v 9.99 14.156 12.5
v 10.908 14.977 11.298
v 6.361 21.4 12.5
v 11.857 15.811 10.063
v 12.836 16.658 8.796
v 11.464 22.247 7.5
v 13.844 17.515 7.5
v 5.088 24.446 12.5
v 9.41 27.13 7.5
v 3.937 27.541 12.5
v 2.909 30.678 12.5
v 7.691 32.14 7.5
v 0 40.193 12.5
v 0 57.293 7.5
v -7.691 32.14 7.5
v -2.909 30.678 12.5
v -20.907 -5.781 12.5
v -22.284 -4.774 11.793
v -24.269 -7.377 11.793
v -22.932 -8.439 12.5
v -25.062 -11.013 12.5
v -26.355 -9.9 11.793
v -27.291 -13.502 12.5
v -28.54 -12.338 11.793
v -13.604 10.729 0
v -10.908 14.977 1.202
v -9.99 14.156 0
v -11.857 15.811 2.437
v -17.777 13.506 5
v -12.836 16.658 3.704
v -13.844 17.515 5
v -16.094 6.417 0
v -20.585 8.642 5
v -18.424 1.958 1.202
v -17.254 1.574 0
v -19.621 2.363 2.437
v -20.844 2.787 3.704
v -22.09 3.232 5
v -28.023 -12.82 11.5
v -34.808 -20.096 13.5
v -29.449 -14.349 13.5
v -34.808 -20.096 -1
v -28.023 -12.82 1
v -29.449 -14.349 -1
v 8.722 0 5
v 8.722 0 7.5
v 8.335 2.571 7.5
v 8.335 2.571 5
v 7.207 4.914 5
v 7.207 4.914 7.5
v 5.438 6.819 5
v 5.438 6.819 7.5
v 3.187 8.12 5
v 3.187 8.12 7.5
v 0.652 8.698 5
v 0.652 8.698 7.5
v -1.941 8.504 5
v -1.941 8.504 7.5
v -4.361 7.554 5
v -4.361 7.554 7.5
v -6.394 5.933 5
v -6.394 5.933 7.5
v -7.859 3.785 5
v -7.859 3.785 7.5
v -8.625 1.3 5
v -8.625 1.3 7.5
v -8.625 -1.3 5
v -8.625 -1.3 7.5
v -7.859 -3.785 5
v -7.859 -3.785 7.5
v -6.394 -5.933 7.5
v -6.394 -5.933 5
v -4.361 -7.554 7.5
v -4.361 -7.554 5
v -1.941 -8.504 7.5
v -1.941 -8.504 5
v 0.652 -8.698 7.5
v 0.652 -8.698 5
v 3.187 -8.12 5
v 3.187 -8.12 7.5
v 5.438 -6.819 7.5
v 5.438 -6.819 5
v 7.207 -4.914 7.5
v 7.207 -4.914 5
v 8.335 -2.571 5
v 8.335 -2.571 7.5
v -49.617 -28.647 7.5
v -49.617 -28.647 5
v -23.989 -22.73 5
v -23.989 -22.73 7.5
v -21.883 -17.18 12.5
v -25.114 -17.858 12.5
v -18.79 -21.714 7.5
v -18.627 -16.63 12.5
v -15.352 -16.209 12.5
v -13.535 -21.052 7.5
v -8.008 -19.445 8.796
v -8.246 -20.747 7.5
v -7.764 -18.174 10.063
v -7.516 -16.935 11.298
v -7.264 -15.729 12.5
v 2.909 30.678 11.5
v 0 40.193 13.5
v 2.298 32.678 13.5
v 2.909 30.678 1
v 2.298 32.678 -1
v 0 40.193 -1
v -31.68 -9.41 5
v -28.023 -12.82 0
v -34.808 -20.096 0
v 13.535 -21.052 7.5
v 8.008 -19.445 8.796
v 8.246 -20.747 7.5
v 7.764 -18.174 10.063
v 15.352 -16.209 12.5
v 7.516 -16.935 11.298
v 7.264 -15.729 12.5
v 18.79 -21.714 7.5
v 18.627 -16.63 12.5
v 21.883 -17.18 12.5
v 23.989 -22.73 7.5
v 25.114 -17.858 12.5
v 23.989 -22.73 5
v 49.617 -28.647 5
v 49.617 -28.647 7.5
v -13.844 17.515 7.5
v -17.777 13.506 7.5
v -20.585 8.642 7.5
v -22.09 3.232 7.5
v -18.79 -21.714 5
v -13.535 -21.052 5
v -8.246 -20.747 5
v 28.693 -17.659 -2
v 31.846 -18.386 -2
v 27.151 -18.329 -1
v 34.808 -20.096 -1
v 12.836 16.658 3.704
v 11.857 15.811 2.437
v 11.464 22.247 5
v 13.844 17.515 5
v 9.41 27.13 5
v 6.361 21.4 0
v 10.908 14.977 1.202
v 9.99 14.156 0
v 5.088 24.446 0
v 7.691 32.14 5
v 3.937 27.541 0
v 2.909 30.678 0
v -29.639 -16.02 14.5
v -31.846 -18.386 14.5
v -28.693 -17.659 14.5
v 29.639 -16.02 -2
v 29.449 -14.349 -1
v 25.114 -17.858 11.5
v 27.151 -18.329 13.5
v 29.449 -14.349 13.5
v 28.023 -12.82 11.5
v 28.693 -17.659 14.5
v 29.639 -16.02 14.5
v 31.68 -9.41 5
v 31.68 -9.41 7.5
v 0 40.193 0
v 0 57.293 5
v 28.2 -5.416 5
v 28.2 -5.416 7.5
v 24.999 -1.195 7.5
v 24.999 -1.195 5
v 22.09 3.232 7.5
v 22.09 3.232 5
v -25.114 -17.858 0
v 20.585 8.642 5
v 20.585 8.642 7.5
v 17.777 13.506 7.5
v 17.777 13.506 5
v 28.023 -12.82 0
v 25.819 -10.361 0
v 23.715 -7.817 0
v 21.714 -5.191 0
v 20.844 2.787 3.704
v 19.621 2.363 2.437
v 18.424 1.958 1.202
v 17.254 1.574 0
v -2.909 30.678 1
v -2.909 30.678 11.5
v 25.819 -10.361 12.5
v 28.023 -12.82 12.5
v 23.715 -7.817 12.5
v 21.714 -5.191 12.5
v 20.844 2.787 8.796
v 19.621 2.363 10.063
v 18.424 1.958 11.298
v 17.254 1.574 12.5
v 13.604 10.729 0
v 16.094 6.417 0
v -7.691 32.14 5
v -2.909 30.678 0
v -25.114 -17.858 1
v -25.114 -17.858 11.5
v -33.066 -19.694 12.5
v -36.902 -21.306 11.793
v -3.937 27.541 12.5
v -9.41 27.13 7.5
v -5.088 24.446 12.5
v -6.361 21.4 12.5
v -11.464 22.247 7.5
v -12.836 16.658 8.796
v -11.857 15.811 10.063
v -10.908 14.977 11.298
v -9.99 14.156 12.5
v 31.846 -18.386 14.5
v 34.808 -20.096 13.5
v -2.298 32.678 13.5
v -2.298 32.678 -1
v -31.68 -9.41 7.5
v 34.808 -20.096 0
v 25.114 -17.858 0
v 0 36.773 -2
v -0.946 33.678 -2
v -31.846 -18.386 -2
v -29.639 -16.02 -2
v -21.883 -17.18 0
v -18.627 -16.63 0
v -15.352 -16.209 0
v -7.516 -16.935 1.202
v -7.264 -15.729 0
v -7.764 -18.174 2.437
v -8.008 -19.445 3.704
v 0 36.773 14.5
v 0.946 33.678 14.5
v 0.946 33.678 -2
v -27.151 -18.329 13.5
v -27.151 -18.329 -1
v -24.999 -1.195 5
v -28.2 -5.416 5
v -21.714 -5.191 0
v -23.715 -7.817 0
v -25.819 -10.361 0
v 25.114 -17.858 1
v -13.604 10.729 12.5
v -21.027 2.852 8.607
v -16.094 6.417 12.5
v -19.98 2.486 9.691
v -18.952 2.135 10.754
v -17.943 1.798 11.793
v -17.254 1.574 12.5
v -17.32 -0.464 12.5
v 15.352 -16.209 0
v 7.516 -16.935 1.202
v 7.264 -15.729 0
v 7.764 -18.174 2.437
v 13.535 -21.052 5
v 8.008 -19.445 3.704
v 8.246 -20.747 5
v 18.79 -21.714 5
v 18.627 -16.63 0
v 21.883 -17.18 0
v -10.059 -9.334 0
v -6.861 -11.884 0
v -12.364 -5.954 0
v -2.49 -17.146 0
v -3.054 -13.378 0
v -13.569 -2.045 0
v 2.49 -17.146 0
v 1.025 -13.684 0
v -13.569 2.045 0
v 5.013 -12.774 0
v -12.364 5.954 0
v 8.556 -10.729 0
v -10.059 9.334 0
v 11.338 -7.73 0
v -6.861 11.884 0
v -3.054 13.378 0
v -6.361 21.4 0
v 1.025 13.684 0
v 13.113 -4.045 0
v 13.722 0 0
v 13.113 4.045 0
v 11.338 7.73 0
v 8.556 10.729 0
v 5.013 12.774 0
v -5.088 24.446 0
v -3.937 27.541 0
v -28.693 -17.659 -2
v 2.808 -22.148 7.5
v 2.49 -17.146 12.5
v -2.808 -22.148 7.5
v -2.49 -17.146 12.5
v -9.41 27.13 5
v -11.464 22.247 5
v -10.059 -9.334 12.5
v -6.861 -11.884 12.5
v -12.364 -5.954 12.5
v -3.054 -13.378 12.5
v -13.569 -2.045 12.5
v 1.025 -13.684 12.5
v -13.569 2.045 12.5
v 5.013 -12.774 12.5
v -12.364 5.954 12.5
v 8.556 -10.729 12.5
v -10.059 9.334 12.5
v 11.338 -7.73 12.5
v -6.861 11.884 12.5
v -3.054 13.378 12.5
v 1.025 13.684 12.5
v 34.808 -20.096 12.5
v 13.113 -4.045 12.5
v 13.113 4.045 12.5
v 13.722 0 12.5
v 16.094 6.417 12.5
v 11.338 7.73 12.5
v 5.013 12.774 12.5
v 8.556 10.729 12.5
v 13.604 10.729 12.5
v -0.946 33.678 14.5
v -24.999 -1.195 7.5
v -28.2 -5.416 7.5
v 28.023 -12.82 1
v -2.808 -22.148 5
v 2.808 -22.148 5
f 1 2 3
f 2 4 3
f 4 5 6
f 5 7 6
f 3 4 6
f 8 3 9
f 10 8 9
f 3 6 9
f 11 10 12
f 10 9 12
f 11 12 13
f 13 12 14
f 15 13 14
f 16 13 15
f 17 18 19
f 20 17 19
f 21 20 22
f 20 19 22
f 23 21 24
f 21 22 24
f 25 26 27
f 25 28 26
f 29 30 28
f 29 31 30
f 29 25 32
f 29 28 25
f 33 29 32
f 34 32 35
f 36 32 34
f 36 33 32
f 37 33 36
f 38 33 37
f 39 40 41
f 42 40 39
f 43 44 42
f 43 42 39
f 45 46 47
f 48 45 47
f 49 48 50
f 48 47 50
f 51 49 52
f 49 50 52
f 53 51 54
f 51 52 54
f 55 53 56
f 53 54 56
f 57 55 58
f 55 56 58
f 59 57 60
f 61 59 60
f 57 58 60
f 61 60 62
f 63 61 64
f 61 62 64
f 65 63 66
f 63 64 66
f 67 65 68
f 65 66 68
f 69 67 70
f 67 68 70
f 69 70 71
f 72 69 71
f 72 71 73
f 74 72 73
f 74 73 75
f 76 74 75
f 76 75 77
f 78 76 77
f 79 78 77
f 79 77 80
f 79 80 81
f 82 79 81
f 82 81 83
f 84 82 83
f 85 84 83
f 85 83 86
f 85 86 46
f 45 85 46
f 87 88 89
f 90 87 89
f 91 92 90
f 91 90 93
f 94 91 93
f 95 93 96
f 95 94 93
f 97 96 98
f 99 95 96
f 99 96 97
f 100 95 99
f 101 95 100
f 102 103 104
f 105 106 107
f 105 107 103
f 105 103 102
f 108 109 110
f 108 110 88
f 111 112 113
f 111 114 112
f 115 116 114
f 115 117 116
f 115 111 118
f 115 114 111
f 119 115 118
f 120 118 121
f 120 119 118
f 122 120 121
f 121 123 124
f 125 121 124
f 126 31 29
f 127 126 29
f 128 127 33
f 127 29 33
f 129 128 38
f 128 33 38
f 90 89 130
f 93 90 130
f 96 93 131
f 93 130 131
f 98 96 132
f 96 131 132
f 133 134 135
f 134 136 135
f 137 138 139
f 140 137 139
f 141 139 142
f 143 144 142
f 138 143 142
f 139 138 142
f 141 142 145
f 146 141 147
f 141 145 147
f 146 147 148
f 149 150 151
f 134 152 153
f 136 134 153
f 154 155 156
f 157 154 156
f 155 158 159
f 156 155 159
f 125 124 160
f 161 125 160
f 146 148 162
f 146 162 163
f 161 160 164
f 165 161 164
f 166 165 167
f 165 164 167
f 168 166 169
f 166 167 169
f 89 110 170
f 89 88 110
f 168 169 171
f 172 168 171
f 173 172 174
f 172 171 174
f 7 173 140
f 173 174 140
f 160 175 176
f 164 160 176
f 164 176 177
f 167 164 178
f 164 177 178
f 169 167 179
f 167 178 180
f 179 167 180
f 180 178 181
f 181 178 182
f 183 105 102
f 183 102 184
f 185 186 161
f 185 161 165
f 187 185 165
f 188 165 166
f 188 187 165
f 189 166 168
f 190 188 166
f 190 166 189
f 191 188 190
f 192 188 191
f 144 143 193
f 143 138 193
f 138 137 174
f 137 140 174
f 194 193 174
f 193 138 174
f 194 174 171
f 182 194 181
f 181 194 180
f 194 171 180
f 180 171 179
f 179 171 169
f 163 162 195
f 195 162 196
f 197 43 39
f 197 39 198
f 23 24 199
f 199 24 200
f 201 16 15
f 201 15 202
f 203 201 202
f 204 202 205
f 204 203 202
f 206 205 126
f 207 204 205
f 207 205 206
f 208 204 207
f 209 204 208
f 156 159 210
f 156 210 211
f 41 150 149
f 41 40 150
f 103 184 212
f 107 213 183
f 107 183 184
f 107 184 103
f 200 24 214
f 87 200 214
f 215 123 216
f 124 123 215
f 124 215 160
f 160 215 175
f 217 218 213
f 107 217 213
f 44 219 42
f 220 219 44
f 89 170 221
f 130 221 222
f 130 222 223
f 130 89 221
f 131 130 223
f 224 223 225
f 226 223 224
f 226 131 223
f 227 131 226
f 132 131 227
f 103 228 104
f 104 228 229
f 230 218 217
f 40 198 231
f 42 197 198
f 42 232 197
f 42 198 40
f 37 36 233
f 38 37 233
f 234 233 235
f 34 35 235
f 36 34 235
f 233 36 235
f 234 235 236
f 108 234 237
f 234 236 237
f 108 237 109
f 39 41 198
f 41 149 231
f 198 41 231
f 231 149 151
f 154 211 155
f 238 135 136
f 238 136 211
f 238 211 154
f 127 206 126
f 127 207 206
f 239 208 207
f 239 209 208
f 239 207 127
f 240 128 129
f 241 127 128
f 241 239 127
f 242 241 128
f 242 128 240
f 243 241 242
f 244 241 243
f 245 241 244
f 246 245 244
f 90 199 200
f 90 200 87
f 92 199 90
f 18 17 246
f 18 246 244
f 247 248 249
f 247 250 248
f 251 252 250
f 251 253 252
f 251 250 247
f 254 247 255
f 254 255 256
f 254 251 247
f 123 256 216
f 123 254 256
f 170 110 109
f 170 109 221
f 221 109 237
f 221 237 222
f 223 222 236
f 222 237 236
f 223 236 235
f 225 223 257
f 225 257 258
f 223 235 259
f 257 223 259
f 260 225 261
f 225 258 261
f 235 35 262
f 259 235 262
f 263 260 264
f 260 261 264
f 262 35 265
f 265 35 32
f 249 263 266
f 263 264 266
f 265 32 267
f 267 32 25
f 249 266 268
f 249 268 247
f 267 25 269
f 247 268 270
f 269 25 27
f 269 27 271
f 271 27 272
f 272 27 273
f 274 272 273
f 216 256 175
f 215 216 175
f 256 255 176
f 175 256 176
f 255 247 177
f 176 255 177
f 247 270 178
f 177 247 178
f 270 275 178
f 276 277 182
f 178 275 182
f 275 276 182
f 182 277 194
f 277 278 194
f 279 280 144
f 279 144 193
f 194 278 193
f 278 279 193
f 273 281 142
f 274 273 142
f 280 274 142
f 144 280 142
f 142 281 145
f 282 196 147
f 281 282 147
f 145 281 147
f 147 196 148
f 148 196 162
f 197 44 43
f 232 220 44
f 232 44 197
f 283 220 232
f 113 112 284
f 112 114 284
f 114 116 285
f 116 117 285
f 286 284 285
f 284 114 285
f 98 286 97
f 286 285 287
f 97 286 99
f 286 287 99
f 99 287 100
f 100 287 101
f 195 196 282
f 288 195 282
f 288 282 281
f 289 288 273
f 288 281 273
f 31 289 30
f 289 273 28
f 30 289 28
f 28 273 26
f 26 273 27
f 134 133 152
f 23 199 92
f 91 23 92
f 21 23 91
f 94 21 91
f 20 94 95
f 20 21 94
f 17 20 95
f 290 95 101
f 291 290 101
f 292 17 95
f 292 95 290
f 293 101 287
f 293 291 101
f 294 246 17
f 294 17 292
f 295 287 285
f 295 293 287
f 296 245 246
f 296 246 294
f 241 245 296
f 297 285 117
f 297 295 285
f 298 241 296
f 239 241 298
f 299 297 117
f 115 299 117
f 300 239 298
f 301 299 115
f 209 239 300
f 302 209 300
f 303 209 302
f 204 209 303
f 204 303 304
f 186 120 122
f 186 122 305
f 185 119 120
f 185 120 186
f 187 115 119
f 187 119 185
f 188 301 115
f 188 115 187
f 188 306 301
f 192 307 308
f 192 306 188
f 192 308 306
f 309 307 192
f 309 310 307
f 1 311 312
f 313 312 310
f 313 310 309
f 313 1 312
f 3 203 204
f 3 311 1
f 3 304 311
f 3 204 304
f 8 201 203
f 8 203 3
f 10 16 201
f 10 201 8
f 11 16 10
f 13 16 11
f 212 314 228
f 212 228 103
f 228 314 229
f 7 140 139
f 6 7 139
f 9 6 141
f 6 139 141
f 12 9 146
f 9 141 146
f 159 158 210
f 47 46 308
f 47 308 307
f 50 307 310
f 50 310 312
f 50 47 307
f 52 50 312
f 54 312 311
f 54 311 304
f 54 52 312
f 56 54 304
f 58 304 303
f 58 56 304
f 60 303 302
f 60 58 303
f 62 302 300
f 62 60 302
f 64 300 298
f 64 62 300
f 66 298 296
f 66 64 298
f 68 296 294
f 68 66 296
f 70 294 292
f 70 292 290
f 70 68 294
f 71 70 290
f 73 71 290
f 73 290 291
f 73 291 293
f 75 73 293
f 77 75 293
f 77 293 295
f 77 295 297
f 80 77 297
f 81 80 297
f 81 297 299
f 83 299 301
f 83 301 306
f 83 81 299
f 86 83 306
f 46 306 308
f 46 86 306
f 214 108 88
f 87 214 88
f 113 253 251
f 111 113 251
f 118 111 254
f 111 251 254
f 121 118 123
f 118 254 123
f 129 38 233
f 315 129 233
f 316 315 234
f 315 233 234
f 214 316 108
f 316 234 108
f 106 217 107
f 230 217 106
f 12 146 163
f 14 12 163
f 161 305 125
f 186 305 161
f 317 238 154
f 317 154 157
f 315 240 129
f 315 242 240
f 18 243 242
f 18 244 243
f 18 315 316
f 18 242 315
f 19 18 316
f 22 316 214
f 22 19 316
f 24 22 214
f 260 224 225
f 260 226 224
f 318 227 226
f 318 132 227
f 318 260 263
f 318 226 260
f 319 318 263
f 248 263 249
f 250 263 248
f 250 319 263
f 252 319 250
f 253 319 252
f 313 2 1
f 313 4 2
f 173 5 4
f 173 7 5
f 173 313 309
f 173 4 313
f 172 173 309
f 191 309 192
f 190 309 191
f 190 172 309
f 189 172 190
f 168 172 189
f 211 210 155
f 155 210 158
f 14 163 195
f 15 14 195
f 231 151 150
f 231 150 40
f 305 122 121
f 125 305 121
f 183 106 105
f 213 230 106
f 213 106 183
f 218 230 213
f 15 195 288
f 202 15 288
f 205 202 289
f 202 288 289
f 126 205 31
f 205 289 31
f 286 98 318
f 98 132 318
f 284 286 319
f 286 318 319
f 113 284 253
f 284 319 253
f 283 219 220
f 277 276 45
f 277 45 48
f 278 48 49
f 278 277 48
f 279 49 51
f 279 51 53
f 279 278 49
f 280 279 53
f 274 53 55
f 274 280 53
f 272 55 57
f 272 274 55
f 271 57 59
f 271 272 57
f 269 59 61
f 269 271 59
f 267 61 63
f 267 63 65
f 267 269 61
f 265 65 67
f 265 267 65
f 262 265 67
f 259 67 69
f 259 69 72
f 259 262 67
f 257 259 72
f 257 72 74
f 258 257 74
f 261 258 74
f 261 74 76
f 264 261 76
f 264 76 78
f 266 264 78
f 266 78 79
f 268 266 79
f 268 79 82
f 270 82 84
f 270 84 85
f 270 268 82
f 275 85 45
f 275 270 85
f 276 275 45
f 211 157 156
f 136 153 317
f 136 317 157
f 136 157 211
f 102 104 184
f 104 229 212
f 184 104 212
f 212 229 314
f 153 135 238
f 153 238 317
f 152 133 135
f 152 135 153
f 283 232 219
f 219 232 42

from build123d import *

# Parameters (mm, degrees)
F1_DEPTH      = 12.5
F2_R          = 8.722464072
F3_DEPTH      = 25
F4_C1_SIZE    = 5
F4_C2_SIZE    = 5
F4_C3_SIZE    = 5
F4_C4_SIZE    = 5
F4_C5_SIZE    = 5
F4_C6_SIZE    = 5
F4_C7_SIZE    = 5
F4_C8_SIZE    = 5
F4_C9_SIZE    = 5
F4_C10_SIZE   = 5
F4_C11_SIZE   = 5
F4_C12_SIZE   = 5
F4_C13_SIZE   = 5
F4_C14_SIZE   = 5
F4_C15_SIZE   = 4.9999
F4_C16_SIZE   = 4.9999
F4_C17_SIZE   = 4.9999
F4_C18_SIZE   = 4.9999
F6_DEPTH      = 2
F6_DEPTH_BACK = 14.5
F7_SIZE       = 1
F7_2_SIZE     = 1
F7_3_SIZE     = 1
F7_4_SIZE     = 1
F8_SIZE       = 1
F9_SIZE       = 5
F10_SIZE      = 3
F10_2_SIZE    = 3
F10_3_SIZE    = 3


# Not quite as in the source:
# - a fillet or chamfer is up to 0.001 mm smaller than in the source, because OpenCascade refuses the exact size


with BuildPart() as f1:
    # F0 (on Top) → F1 (new body)
    with BuildSketch(Plane.XY):
        with BuildLine():
            ThreePointArc((-8.2462994883, -20.746848224), (-19.3345513229, -11.162808411), (-22.0904473546, 3.2319192679))
            ThreePointArc((-22.0904473546, 3.2319192679), (-26.5638124389, -3.3325951278), (-31.6795363045, -9.4098653834))
            Line((-31.6795363045, -9.4098653834), (-49.6173238599, -28.646575287))
            Line((-49.6173238599, -28.646575287), (-23.9889506205, -22.7303505281))
            ThreePointArc((-23.9889506205, -22.7303505281), (-16.1680182607, -21.3386388295), (-8.2462994883, -20.746848224))
        make_face()
        with BuildLine():
            ThreePointArc((-7.690585684, 32.1402159115), (-10.3957941782, 24.6712339574), (-13.8441478662, 17.5149289561))
            ThreePointArc((-13.8441478662, 17.5149289561), (-19.3345513229, 11.162808411), (-22.0904473546, 3.2319192679))
            ThreePointArc((-22.0904473546, 3.2319192679), (-19.3345513229, -11.162808411), (-8.2462994883, -20.746848224))
            ThreePointArc((-8.2462994883, -20.746848224), (0, -22.3256168219), (8.2462994883, -20.746848224))
            ThreePointArc((8.2462994883, -20.746848224), (19.3345513229, -11.162808411), (22.0904473546, 3.2319192679))
            ThreePointArc((22.0904473546, 3.2319192679), (19.3345513229, 11.162808411), (13.8441478662, 17.5149289561))
            ThreePointArc((13.8441478662, 17.5149289561), (10.3957941782, 24.6712339574), (7.690585684, 32.1402159115))
            Line((7.690585684, 32.1402159115), (0, 57.293150574))
            Line((0, 57.293150574), (-7.690585684, 32.1402159115))
        make_face()
        with BuildLine():
            ThreePointArc((22.0904473546, 3.2319192679), (19.3345513229, -11.162808411), (8.2462994883, -20.746848224))
            ThreePointArc((8.2462994883, -20.746848224), (16.1680182607, -21.3386388295), (23.9889506205, -22.7303505281))
            Line((23.9889506205, -22.7303505281), (49.6173238599, -28.646575287))
            Line((49.6173238599, -28.646575287), (31.6795363045, -9.4098653834))
            ThreePointArc((31.6795363045, -9.4098653834), (26.5638124389, -3.3325951278), (22.0904473546, 3.2319192679))
        make_face()
    extrude(amount=F1_DEPTH)

    # F2 (on face) → F3 (cut)
    with BuildSketch(Plane.XY.offset(12.5)):
        Circle(F2_R)
    extrude(amount=-F3_DEPTH, mode=Mode.SUBTRACT)

    # F4: chamfer of 5 on 18 edges, made by hand

    # F4_c1
    f4_c1_edges = [f1.edges().sort_by_distance(p)[0] for p in [
        (-16.1680182607, -21.3386388295, 0),
        (-36.8031372402, -25.6884629075, 0),
    ]]
    chamfer(f4_c1_edges, length=F4_C1_SIZE)

    # F4_c2
    f4_c2_edges = [f1.edges().sort_by_distance(p)[0] for p in [
        (-16.1680182607, -21.3386388295, 12.5),
        (-36.8031372402, -25.6884629075, 12.5),
    ]]
    chamfer(f4_c2_edges, length=F4_C2_SIZE)

    # F4_c3
    f4_c3_edges = [f1.edges().sort_by_distance(p)[0] for p in [
        (-37.5996515992, -15.7586717882, 0),
        (-26.5638124389, -3.3325951278, 0),
    ]]
    chamfer(f4_c3_edges, length=F4_C3_SIZE)

    # F4_c4
    f4_c4_edges = [f1.edges().sort_by_distance(p)[0] for p in [
        (16.1680182607, -21.3386388295, 0),
        (36.8031372402, -25.6884629075, 0),
    ]]
    chamfer(f4_c4_edges, length=F4_C4_SIZE)

    # F4_c5
    f4_c5_edges = [f1.edges().sort_by_distance(p)[0] for p in [
        (37.5996515992, -15.7586717882, 0),
        (26.5638124389, -3.3325951278, 0),
    ]]
    chamfer(f4_c5_edges, length=F4_C5_SIZE)

    # F4_c6
    f4_c6_edges = [f1.edges().sort_by_distance(p)[0] for p in [
        (-10.3957941782, 24.6712339574, 0),
        (-3.845292842, 44.7166832427, 0),
    ]]
    chamfer(f4_c6_edges, length=F4_C6_SIZE)

    # F4_c7
    f4_c7_edges = [f1.edges().sort_by_distance(p)[0] for p in [
        (5.1524157011, 40.4415893525, 0),
        (10.3957941782, 24.6712339574, 0),
    ]]
    chamfer(f4_c7_edges, length=F4_C7_SIZE)

    # F4_c8
    f4_c8_edges = [f1.edges().sort_by_distance(p)[0] for p in [
        (-37.5996515992, -15.7586717882, 12.5),
        (-26.5638124389, -3.3325951278, 12.5),
    ]]
    chamfer(f4_c8_edges, length=F4_C8_SIZE)

    # F4_c9
    f4_c9_edges = [f1.edges().sort_by_distance(p)[0] for p in [
        (16.1680182607, -21.3386388295, 12.5),
        (36.8031372402, -25.6884629075, 12.5),
    ]]
    chamfer(f4_c9_edges, length=F4_C9_SIZE)

    # F4_c10
    f4_c10_edges = [f1.edges().sort_by_distance(p)[0] for p in [
        (37.5996515992, -15.7586717882, 12.5),
        (26.5638124389, -3.3325951278, 12.5),
    ]]
    chamfer(f4_c10_edges, length=F4_C10_SIZE)

    # F4_c11
    f4_c11_edges = [f1.edges().sort_by_distance(p)[0] for p in [
        (-10.3957941782, 24.6712339574, 12.5),
        (-3.845292842, 44.7166832427, 12.5),
    ]]
    chamfer(f4_c11_edges, length=F4_C11_SIZE)

    # F4_c12
    f4_c12_edges = [f1.edges().sort_by_distance(p)[0] for p in [
        (5.1524157011, 40.4415893525, 12.5),
        (10.3957941782, 24.6712339574, 12.5),
    ]]
    chamfer(f4_c12_edges, length=F4_C12_SIZE)

    # F4_c13
    f4_c13_edges = [f1.edges().sort_by_distance(p)[0] for p in [
        (0, -22.3256168219, 0),
    ]]
    chamfer(f4_c13_edges, length=F4_C13_SIZE)

    # F4_c14
    f4_c14_edges = [f1.edges().sort_by_distance(p)[0] for p in [
        (0, -22.3256168219, 12.5),
    ]]
    chamfer(f4_c14_edges, length=F4_C14_SIZE)

    # F4_c15 (size 5 in the source; OpenCascade refuses exactly that, so slightly less here)
    f4_c15_edges = [f1.edges().sort_by_distance(p)[0] for p in [
        (-19.3345513229, 11.162808411, 0),
    ]]
    chamfer(f4_c15_edges, length=F4_C15_SIZE)

    # F4_c16 (size 5 in the source; OpenCascade refuses exactly that, so slightly less here)
    f4_c16_edges = [f1.edges().sort_by_distance(p)[0] for p in [
        (19.3345513229, 11.162808411, 0),
    ]]
    chamfer(f4_c16_edges, length=F4_C16_SIZE)

    # F4_c17 (size 5 in the source; OpenCascade refuses exactly that, so slightly less here)
    f4_c17_edges = [f1.edges().sort_by_distance(p)[0] for p in [
        (-19.3345513229, 11.162808411, 12.5),
    ]]
    chamfer(f4_c17_edges, length=F4_C17_SIZE)

    # F4_c18 (size 5 in the source; OpenCascade refuses exactly that, so slightly less here)
    f4_c18_edges = [f1.edges().sort_by_distance(p)[0] for p in [
        (19.3345513229, 11.162808411, 12.5),
    ]]
    chamfer(f4_c18_edges, length=F4_C18_SIZE)

    # F7#4
    f7_4_edges = [f1.edges().sort_by_distance(p)[0] for p in [
        (-31.415331, -16.458085, 12.5),
    ]]
    chamfer(f7_4_edges, length=F7_4_SIZE)

    # F9
    f9_edges = [f1.edges().sort_by_distance(p)[0] for p in [
        (-8.722464, 0, 12.5),
        (-8.722464, 0, 0),
    ]]
    chamfer(f9_edges, length=F9_SIZE)


with BuildPart() as f6:
    # F5 (on face) → F6 (new body, two sides)
    with BuildSketch(Plane(origin=(0, 0, 0), x_dir=(1, 0, 0), z_dir=(0, 0, -1))) as f6_sk:
        Polygon((-28.0226981411, 12.8197824861), (-25.1136063745, 17.8584772298), (-34.8079642097, 20.0963875064), align=None)
    extrude(amount=F6_DEPTH)
    extrude(f6_sk.sketch, amount=-F6_DEPTH_BACK)

    # F7#2
    f7_2_edges = [f6.edges().sort_by_distance(p)[0] for p in [
        (-29.960785, -18.977432, -2),
        (-31.415331, -16.458085, -2),
        (-29.960785, -18.977432, 14.5),
    ]]
    chamfer(f7_2_edges, length=F7_2_SIZE)

    # F8
    f8_edges = [f6.edges().sort_by_distance(p)[0] for p in [
        (-30.805575, -15.804175, 14.5),
    ]]
    chamfer(f8_edges, length=F8_SIZE)

    # F10#2
    f10_2_edges = [f6.edges().sort_by_distance(p)[0] for p in [
        (-26.568152, -15.33913, 14.5),
        (-26.568152, -15.33913, -2),
    ]]
    chamfer(f10_2_edges, length=F10_2_SIZE)


with BuildPart() as f6b:
    # F5 (on face) → F6, piece 2 (new body, two sides)
    with BuildSketch(Plane(origin=(0, 0, 0), x_dir=(1, 0, 0), z_dir=(0, 0, -1))) as f6_2_sk:
        Polygon((0, -40.1927750129), (2.9090917667, -30.6782597158), (-2.9090917667, -30.6782597158), align=None)
    extrude(amount=F6_DEPTH)
    extrude(f6_2_sk.sketch, amount=-F6_DEPTH_BACK)

    # F7#3
    f7_3_edges = [f6b.edges().sort_by_distance(p)[0] for p in [
        (1.454546, 35.435517, -2),
        (-1.454546, 35.435517, -2),
        (1.454546, 35.435517, 14.5),
        (-1.454546, 35.435517, 14.5),
    ]]
    chamfer(f7_3_edges, length=F7_3_SIZE)

    # F10
    f10_edges = [f6b.edges().sort_by_distance(p)[0] for p in [
        (0, 30.67826, -2),
        (0, 30.67826, 14.5),
    ]]
    chamfer(f10_edges, length=F10_SIZE)


with BuildPart() as f6c:
    # F5 (on face) → F6, piece 3 (new body, two sides)
    with BuildSketch(Plane(origin=(0, 0, 0), x_dir=(1, 0, 0), z_dir=(0, 0, -1))) as f6_3_sk:
        Polygon((28.0226981411, 12.8197824861), (34.8079642097, 20.0963875064), (25.1136063745, 17.8584772298), align=None)
    extrude(amount=F6_DEPTH)
    extrude(f6_3_sk.sketch, amount=-F6_DEPTH_BACK)

    # F7
    f7_edges = [f6c.edges().sort_by_distance(p)[0] for p in [
        (29.960785, -18.977432, -2),
        (31.415331, -16.458085, -2),
        (31.415331, -16.458085, 14.5),
        (29.960785, -18.977432, 14.5),
    ]]
    chamfer(f7_edges, length=F7_SIZE)

    # F10#3
    f10_3_edges = [f6c.edges().sort_by_distance(p)[0] for p in [
        (26.568152, -15.33913, 14.5),
        (26.568152, -15.33913, -2),
    ]]
    chamfer(f10_3_edges, length=F10_3_SIZE)


solid = Compound([f1.part, f6.part, f6b.part, f6c.part])
